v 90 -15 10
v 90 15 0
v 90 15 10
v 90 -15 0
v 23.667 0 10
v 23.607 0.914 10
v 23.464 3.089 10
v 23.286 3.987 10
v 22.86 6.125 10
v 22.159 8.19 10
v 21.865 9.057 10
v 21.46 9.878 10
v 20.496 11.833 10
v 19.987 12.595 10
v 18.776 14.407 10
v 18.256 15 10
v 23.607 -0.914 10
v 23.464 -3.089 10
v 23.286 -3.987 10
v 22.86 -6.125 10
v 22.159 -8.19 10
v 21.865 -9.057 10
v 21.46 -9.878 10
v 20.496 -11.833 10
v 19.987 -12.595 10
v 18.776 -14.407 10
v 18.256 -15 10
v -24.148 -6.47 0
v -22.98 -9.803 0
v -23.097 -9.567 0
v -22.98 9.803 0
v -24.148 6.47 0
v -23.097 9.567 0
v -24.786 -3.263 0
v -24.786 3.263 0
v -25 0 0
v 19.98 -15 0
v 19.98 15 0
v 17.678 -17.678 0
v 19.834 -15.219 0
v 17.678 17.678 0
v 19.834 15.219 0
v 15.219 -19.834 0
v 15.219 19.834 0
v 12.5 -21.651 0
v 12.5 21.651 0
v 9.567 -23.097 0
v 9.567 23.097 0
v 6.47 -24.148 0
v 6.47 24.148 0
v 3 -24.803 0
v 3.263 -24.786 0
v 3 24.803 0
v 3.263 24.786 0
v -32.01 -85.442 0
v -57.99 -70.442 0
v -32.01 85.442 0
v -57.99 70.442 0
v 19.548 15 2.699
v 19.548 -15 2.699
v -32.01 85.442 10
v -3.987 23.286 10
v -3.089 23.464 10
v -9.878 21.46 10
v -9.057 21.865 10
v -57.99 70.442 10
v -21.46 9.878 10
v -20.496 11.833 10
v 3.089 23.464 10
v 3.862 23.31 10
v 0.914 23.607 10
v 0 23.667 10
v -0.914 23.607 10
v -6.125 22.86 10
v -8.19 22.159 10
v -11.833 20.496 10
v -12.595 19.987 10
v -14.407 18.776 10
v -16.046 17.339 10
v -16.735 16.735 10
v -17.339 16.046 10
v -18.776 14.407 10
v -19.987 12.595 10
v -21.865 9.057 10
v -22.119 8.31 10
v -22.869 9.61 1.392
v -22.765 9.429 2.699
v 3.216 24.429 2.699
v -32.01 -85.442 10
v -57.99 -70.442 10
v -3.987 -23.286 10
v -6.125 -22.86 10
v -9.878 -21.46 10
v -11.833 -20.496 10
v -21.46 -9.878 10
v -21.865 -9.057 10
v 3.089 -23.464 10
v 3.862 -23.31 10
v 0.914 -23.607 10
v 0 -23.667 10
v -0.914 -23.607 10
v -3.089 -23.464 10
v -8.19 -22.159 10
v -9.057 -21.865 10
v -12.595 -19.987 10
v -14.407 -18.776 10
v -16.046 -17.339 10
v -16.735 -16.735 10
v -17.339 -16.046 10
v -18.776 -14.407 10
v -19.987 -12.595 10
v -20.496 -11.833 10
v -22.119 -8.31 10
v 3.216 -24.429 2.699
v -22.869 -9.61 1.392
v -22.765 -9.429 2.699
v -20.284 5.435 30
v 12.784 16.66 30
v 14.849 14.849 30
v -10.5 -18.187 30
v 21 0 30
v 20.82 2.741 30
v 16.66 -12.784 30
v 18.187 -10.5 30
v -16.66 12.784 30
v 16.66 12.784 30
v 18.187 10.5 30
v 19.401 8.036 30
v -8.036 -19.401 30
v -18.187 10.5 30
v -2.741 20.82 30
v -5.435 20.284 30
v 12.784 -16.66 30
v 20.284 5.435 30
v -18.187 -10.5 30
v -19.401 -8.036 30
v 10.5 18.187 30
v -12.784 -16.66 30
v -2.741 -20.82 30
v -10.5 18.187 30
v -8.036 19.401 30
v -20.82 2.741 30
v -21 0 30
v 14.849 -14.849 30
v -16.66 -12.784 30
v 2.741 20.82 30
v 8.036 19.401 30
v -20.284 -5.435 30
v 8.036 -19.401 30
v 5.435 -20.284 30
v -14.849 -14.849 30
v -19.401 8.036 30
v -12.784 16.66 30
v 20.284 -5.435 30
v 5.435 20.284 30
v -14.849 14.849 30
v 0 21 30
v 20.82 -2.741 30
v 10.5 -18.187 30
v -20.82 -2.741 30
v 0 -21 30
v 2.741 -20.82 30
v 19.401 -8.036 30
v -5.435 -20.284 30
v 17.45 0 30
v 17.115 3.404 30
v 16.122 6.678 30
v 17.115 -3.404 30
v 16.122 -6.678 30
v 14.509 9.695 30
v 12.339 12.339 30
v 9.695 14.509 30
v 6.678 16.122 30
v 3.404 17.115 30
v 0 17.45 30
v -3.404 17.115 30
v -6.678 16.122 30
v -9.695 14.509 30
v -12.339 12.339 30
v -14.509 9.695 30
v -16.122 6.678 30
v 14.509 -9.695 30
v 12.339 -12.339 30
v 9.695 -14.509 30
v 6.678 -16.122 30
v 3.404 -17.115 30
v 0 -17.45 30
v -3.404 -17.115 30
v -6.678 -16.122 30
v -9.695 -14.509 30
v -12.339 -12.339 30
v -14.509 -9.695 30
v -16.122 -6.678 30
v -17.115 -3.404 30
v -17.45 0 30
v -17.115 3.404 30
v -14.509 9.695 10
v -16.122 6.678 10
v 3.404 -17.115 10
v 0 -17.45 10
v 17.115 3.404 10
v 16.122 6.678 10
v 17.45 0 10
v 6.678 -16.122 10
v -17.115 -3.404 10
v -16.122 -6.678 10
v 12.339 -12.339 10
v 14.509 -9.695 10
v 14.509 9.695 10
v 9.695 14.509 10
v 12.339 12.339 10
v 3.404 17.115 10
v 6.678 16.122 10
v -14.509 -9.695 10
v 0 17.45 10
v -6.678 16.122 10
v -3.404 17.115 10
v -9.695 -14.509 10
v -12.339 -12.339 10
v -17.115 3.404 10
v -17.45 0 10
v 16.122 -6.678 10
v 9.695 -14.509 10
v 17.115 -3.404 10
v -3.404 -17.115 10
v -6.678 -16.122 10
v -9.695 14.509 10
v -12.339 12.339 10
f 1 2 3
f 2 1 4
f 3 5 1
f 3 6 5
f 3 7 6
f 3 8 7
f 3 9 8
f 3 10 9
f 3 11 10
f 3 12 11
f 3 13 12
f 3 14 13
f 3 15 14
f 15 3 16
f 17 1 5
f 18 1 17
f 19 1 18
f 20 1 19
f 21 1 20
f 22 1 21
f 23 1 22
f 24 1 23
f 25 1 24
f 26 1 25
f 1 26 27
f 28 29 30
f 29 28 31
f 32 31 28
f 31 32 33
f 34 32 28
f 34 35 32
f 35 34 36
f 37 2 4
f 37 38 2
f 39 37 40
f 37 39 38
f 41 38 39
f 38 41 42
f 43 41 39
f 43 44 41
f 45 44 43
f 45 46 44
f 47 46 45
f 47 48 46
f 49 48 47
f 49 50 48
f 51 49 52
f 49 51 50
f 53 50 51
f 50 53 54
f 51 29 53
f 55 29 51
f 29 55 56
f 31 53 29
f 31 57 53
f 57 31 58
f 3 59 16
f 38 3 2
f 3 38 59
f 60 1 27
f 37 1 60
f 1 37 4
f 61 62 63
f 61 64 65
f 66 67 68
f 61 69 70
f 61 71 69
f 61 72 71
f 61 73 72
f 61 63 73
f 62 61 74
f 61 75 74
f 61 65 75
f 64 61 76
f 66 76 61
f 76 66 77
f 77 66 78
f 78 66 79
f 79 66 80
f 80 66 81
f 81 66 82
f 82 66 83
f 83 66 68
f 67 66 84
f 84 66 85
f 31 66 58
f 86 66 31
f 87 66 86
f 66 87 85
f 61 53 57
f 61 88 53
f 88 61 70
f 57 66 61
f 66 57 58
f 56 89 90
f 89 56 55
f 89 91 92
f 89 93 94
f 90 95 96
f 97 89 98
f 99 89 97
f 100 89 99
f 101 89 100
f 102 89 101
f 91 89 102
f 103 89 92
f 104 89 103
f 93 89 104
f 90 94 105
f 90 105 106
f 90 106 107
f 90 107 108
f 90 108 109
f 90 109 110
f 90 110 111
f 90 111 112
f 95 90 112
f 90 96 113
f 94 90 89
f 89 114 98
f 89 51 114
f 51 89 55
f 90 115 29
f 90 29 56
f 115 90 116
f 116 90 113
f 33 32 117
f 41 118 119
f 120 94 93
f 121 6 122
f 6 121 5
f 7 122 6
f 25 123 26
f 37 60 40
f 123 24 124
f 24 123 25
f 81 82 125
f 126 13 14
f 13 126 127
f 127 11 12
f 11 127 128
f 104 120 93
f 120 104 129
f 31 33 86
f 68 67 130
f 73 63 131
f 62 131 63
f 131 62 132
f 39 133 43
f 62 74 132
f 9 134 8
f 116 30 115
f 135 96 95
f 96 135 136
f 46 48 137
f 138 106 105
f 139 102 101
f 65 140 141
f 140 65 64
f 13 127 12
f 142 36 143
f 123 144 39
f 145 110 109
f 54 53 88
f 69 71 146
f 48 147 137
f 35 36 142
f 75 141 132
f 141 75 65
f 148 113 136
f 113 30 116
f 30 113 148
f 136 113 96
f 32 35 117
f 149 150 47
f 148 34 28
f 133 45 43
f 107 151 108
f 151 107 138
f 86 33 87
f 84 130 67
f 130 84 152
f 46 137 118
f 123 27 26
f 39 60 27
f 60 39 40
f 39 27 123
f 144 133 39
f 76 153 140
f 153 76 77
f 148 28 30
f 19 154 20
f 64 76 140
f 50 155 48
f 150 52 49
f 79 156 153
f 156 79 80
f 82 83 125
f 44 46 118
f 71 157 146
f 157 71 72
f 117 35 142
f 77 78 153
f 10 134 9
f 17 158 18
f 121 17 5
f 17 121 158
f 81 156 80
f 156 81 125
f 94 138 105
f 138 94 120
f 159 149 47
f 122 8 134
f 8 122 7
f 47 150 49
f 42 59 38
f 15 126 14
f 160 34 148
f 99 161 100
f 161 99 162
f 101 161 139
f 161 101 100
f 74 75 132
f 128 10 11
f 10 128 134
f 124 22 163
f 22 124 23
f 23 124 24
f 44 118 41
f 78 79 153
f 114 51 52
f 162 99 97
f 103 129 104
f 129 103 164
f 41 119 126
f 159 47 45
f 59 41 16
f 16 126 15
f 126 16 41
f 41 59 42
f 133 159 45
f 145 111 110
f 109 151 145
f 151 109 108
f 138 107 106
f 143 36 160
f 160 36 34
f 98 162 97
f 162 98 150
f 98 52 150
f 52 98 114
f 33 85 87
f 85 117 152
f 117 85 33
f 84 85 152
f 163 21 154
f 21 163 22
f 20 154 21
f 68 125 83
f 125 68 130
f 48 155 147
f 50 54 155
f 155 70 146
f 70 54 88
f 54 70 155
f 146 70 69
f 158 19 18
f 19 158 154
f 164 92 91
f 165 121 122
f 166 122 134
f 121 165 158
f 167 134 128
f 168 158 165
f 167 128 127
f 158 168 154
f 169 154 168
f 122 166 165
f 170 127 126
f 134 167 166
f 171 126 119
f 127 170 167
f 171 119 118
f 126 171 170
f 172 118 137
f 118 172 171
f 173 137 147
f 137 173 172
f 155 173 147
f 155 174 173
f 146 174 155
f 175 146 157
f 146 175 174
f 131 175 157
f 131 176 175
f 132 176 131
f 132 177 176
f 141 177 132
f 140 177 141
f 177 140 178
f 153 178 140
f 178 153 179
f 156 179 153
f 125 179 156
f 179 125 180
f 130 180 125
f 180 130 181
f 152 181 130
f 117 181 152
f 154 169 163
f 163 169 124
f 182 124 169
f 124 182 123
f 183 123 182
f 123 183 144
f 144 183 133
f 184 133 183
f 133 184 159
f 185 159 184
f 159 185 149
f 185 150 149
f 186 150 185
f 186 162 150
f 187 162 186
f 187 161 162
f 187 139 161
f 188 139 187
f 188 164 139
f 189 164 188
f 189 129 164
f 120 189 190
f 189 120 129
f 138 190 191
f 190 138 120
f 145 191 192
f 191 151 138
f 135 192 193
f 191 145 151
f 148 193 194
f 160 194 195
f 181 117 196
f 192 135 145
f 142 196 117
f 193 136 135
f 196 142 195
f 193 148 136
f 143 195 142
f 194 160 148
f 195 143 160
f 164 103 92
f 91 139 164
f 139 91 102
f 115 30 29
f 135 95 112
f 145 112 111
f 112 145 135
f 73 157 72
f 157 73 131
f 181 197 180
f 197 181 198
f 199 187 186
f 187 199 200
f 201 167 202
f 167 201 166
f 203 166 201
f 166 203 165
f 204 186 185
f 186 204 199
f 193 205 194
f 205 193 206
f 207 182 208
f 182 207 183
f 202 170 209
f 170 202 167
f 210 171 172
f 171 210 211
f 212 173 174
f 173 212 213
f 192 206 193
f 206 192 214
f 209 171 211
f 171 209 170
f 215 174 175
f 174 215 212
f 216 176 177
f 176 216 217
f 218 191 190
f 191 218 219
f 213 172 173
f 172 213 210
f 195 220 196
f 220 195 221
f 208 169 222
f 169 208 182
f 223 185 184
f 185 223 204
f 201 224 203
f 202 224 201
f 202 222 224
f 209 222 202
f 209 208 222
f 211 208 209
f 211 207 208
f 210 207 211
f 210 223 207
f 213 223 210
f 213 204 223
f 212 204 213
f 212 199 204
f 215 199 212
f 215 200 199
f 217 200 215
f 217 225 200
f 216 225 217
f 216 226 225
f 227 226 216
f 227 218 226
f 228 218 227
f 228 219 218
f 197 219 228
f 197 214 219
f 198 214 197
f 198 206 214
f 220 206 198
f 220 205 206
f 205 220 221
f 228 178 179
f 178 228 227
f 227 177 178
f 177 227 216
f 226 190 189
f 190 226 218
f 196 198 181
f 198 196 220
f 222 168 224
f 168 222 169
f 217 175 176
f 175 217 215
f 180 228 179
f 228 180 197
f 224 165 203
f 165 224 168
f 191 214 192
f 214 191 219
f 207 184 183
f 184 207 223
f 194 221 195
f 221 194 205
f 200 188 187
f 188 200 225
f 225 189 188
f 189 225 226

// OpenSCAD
legSize=[80,30,10];
tolerance=0.3;

difference(){
  union(){
    $fn=48;
    cylinder(r1=50/2, r2=42/2, h=30);

    for(i=[0:120:360]){
      rotate([0,0,i])
      translate(legSize*-.5+[50,0,5])
        cube(legSize);
    }
  }
  
  $fn=32;
  translate([0,0,10])
  cylinder(r=34.3/2+tolerance,h=40);
}
